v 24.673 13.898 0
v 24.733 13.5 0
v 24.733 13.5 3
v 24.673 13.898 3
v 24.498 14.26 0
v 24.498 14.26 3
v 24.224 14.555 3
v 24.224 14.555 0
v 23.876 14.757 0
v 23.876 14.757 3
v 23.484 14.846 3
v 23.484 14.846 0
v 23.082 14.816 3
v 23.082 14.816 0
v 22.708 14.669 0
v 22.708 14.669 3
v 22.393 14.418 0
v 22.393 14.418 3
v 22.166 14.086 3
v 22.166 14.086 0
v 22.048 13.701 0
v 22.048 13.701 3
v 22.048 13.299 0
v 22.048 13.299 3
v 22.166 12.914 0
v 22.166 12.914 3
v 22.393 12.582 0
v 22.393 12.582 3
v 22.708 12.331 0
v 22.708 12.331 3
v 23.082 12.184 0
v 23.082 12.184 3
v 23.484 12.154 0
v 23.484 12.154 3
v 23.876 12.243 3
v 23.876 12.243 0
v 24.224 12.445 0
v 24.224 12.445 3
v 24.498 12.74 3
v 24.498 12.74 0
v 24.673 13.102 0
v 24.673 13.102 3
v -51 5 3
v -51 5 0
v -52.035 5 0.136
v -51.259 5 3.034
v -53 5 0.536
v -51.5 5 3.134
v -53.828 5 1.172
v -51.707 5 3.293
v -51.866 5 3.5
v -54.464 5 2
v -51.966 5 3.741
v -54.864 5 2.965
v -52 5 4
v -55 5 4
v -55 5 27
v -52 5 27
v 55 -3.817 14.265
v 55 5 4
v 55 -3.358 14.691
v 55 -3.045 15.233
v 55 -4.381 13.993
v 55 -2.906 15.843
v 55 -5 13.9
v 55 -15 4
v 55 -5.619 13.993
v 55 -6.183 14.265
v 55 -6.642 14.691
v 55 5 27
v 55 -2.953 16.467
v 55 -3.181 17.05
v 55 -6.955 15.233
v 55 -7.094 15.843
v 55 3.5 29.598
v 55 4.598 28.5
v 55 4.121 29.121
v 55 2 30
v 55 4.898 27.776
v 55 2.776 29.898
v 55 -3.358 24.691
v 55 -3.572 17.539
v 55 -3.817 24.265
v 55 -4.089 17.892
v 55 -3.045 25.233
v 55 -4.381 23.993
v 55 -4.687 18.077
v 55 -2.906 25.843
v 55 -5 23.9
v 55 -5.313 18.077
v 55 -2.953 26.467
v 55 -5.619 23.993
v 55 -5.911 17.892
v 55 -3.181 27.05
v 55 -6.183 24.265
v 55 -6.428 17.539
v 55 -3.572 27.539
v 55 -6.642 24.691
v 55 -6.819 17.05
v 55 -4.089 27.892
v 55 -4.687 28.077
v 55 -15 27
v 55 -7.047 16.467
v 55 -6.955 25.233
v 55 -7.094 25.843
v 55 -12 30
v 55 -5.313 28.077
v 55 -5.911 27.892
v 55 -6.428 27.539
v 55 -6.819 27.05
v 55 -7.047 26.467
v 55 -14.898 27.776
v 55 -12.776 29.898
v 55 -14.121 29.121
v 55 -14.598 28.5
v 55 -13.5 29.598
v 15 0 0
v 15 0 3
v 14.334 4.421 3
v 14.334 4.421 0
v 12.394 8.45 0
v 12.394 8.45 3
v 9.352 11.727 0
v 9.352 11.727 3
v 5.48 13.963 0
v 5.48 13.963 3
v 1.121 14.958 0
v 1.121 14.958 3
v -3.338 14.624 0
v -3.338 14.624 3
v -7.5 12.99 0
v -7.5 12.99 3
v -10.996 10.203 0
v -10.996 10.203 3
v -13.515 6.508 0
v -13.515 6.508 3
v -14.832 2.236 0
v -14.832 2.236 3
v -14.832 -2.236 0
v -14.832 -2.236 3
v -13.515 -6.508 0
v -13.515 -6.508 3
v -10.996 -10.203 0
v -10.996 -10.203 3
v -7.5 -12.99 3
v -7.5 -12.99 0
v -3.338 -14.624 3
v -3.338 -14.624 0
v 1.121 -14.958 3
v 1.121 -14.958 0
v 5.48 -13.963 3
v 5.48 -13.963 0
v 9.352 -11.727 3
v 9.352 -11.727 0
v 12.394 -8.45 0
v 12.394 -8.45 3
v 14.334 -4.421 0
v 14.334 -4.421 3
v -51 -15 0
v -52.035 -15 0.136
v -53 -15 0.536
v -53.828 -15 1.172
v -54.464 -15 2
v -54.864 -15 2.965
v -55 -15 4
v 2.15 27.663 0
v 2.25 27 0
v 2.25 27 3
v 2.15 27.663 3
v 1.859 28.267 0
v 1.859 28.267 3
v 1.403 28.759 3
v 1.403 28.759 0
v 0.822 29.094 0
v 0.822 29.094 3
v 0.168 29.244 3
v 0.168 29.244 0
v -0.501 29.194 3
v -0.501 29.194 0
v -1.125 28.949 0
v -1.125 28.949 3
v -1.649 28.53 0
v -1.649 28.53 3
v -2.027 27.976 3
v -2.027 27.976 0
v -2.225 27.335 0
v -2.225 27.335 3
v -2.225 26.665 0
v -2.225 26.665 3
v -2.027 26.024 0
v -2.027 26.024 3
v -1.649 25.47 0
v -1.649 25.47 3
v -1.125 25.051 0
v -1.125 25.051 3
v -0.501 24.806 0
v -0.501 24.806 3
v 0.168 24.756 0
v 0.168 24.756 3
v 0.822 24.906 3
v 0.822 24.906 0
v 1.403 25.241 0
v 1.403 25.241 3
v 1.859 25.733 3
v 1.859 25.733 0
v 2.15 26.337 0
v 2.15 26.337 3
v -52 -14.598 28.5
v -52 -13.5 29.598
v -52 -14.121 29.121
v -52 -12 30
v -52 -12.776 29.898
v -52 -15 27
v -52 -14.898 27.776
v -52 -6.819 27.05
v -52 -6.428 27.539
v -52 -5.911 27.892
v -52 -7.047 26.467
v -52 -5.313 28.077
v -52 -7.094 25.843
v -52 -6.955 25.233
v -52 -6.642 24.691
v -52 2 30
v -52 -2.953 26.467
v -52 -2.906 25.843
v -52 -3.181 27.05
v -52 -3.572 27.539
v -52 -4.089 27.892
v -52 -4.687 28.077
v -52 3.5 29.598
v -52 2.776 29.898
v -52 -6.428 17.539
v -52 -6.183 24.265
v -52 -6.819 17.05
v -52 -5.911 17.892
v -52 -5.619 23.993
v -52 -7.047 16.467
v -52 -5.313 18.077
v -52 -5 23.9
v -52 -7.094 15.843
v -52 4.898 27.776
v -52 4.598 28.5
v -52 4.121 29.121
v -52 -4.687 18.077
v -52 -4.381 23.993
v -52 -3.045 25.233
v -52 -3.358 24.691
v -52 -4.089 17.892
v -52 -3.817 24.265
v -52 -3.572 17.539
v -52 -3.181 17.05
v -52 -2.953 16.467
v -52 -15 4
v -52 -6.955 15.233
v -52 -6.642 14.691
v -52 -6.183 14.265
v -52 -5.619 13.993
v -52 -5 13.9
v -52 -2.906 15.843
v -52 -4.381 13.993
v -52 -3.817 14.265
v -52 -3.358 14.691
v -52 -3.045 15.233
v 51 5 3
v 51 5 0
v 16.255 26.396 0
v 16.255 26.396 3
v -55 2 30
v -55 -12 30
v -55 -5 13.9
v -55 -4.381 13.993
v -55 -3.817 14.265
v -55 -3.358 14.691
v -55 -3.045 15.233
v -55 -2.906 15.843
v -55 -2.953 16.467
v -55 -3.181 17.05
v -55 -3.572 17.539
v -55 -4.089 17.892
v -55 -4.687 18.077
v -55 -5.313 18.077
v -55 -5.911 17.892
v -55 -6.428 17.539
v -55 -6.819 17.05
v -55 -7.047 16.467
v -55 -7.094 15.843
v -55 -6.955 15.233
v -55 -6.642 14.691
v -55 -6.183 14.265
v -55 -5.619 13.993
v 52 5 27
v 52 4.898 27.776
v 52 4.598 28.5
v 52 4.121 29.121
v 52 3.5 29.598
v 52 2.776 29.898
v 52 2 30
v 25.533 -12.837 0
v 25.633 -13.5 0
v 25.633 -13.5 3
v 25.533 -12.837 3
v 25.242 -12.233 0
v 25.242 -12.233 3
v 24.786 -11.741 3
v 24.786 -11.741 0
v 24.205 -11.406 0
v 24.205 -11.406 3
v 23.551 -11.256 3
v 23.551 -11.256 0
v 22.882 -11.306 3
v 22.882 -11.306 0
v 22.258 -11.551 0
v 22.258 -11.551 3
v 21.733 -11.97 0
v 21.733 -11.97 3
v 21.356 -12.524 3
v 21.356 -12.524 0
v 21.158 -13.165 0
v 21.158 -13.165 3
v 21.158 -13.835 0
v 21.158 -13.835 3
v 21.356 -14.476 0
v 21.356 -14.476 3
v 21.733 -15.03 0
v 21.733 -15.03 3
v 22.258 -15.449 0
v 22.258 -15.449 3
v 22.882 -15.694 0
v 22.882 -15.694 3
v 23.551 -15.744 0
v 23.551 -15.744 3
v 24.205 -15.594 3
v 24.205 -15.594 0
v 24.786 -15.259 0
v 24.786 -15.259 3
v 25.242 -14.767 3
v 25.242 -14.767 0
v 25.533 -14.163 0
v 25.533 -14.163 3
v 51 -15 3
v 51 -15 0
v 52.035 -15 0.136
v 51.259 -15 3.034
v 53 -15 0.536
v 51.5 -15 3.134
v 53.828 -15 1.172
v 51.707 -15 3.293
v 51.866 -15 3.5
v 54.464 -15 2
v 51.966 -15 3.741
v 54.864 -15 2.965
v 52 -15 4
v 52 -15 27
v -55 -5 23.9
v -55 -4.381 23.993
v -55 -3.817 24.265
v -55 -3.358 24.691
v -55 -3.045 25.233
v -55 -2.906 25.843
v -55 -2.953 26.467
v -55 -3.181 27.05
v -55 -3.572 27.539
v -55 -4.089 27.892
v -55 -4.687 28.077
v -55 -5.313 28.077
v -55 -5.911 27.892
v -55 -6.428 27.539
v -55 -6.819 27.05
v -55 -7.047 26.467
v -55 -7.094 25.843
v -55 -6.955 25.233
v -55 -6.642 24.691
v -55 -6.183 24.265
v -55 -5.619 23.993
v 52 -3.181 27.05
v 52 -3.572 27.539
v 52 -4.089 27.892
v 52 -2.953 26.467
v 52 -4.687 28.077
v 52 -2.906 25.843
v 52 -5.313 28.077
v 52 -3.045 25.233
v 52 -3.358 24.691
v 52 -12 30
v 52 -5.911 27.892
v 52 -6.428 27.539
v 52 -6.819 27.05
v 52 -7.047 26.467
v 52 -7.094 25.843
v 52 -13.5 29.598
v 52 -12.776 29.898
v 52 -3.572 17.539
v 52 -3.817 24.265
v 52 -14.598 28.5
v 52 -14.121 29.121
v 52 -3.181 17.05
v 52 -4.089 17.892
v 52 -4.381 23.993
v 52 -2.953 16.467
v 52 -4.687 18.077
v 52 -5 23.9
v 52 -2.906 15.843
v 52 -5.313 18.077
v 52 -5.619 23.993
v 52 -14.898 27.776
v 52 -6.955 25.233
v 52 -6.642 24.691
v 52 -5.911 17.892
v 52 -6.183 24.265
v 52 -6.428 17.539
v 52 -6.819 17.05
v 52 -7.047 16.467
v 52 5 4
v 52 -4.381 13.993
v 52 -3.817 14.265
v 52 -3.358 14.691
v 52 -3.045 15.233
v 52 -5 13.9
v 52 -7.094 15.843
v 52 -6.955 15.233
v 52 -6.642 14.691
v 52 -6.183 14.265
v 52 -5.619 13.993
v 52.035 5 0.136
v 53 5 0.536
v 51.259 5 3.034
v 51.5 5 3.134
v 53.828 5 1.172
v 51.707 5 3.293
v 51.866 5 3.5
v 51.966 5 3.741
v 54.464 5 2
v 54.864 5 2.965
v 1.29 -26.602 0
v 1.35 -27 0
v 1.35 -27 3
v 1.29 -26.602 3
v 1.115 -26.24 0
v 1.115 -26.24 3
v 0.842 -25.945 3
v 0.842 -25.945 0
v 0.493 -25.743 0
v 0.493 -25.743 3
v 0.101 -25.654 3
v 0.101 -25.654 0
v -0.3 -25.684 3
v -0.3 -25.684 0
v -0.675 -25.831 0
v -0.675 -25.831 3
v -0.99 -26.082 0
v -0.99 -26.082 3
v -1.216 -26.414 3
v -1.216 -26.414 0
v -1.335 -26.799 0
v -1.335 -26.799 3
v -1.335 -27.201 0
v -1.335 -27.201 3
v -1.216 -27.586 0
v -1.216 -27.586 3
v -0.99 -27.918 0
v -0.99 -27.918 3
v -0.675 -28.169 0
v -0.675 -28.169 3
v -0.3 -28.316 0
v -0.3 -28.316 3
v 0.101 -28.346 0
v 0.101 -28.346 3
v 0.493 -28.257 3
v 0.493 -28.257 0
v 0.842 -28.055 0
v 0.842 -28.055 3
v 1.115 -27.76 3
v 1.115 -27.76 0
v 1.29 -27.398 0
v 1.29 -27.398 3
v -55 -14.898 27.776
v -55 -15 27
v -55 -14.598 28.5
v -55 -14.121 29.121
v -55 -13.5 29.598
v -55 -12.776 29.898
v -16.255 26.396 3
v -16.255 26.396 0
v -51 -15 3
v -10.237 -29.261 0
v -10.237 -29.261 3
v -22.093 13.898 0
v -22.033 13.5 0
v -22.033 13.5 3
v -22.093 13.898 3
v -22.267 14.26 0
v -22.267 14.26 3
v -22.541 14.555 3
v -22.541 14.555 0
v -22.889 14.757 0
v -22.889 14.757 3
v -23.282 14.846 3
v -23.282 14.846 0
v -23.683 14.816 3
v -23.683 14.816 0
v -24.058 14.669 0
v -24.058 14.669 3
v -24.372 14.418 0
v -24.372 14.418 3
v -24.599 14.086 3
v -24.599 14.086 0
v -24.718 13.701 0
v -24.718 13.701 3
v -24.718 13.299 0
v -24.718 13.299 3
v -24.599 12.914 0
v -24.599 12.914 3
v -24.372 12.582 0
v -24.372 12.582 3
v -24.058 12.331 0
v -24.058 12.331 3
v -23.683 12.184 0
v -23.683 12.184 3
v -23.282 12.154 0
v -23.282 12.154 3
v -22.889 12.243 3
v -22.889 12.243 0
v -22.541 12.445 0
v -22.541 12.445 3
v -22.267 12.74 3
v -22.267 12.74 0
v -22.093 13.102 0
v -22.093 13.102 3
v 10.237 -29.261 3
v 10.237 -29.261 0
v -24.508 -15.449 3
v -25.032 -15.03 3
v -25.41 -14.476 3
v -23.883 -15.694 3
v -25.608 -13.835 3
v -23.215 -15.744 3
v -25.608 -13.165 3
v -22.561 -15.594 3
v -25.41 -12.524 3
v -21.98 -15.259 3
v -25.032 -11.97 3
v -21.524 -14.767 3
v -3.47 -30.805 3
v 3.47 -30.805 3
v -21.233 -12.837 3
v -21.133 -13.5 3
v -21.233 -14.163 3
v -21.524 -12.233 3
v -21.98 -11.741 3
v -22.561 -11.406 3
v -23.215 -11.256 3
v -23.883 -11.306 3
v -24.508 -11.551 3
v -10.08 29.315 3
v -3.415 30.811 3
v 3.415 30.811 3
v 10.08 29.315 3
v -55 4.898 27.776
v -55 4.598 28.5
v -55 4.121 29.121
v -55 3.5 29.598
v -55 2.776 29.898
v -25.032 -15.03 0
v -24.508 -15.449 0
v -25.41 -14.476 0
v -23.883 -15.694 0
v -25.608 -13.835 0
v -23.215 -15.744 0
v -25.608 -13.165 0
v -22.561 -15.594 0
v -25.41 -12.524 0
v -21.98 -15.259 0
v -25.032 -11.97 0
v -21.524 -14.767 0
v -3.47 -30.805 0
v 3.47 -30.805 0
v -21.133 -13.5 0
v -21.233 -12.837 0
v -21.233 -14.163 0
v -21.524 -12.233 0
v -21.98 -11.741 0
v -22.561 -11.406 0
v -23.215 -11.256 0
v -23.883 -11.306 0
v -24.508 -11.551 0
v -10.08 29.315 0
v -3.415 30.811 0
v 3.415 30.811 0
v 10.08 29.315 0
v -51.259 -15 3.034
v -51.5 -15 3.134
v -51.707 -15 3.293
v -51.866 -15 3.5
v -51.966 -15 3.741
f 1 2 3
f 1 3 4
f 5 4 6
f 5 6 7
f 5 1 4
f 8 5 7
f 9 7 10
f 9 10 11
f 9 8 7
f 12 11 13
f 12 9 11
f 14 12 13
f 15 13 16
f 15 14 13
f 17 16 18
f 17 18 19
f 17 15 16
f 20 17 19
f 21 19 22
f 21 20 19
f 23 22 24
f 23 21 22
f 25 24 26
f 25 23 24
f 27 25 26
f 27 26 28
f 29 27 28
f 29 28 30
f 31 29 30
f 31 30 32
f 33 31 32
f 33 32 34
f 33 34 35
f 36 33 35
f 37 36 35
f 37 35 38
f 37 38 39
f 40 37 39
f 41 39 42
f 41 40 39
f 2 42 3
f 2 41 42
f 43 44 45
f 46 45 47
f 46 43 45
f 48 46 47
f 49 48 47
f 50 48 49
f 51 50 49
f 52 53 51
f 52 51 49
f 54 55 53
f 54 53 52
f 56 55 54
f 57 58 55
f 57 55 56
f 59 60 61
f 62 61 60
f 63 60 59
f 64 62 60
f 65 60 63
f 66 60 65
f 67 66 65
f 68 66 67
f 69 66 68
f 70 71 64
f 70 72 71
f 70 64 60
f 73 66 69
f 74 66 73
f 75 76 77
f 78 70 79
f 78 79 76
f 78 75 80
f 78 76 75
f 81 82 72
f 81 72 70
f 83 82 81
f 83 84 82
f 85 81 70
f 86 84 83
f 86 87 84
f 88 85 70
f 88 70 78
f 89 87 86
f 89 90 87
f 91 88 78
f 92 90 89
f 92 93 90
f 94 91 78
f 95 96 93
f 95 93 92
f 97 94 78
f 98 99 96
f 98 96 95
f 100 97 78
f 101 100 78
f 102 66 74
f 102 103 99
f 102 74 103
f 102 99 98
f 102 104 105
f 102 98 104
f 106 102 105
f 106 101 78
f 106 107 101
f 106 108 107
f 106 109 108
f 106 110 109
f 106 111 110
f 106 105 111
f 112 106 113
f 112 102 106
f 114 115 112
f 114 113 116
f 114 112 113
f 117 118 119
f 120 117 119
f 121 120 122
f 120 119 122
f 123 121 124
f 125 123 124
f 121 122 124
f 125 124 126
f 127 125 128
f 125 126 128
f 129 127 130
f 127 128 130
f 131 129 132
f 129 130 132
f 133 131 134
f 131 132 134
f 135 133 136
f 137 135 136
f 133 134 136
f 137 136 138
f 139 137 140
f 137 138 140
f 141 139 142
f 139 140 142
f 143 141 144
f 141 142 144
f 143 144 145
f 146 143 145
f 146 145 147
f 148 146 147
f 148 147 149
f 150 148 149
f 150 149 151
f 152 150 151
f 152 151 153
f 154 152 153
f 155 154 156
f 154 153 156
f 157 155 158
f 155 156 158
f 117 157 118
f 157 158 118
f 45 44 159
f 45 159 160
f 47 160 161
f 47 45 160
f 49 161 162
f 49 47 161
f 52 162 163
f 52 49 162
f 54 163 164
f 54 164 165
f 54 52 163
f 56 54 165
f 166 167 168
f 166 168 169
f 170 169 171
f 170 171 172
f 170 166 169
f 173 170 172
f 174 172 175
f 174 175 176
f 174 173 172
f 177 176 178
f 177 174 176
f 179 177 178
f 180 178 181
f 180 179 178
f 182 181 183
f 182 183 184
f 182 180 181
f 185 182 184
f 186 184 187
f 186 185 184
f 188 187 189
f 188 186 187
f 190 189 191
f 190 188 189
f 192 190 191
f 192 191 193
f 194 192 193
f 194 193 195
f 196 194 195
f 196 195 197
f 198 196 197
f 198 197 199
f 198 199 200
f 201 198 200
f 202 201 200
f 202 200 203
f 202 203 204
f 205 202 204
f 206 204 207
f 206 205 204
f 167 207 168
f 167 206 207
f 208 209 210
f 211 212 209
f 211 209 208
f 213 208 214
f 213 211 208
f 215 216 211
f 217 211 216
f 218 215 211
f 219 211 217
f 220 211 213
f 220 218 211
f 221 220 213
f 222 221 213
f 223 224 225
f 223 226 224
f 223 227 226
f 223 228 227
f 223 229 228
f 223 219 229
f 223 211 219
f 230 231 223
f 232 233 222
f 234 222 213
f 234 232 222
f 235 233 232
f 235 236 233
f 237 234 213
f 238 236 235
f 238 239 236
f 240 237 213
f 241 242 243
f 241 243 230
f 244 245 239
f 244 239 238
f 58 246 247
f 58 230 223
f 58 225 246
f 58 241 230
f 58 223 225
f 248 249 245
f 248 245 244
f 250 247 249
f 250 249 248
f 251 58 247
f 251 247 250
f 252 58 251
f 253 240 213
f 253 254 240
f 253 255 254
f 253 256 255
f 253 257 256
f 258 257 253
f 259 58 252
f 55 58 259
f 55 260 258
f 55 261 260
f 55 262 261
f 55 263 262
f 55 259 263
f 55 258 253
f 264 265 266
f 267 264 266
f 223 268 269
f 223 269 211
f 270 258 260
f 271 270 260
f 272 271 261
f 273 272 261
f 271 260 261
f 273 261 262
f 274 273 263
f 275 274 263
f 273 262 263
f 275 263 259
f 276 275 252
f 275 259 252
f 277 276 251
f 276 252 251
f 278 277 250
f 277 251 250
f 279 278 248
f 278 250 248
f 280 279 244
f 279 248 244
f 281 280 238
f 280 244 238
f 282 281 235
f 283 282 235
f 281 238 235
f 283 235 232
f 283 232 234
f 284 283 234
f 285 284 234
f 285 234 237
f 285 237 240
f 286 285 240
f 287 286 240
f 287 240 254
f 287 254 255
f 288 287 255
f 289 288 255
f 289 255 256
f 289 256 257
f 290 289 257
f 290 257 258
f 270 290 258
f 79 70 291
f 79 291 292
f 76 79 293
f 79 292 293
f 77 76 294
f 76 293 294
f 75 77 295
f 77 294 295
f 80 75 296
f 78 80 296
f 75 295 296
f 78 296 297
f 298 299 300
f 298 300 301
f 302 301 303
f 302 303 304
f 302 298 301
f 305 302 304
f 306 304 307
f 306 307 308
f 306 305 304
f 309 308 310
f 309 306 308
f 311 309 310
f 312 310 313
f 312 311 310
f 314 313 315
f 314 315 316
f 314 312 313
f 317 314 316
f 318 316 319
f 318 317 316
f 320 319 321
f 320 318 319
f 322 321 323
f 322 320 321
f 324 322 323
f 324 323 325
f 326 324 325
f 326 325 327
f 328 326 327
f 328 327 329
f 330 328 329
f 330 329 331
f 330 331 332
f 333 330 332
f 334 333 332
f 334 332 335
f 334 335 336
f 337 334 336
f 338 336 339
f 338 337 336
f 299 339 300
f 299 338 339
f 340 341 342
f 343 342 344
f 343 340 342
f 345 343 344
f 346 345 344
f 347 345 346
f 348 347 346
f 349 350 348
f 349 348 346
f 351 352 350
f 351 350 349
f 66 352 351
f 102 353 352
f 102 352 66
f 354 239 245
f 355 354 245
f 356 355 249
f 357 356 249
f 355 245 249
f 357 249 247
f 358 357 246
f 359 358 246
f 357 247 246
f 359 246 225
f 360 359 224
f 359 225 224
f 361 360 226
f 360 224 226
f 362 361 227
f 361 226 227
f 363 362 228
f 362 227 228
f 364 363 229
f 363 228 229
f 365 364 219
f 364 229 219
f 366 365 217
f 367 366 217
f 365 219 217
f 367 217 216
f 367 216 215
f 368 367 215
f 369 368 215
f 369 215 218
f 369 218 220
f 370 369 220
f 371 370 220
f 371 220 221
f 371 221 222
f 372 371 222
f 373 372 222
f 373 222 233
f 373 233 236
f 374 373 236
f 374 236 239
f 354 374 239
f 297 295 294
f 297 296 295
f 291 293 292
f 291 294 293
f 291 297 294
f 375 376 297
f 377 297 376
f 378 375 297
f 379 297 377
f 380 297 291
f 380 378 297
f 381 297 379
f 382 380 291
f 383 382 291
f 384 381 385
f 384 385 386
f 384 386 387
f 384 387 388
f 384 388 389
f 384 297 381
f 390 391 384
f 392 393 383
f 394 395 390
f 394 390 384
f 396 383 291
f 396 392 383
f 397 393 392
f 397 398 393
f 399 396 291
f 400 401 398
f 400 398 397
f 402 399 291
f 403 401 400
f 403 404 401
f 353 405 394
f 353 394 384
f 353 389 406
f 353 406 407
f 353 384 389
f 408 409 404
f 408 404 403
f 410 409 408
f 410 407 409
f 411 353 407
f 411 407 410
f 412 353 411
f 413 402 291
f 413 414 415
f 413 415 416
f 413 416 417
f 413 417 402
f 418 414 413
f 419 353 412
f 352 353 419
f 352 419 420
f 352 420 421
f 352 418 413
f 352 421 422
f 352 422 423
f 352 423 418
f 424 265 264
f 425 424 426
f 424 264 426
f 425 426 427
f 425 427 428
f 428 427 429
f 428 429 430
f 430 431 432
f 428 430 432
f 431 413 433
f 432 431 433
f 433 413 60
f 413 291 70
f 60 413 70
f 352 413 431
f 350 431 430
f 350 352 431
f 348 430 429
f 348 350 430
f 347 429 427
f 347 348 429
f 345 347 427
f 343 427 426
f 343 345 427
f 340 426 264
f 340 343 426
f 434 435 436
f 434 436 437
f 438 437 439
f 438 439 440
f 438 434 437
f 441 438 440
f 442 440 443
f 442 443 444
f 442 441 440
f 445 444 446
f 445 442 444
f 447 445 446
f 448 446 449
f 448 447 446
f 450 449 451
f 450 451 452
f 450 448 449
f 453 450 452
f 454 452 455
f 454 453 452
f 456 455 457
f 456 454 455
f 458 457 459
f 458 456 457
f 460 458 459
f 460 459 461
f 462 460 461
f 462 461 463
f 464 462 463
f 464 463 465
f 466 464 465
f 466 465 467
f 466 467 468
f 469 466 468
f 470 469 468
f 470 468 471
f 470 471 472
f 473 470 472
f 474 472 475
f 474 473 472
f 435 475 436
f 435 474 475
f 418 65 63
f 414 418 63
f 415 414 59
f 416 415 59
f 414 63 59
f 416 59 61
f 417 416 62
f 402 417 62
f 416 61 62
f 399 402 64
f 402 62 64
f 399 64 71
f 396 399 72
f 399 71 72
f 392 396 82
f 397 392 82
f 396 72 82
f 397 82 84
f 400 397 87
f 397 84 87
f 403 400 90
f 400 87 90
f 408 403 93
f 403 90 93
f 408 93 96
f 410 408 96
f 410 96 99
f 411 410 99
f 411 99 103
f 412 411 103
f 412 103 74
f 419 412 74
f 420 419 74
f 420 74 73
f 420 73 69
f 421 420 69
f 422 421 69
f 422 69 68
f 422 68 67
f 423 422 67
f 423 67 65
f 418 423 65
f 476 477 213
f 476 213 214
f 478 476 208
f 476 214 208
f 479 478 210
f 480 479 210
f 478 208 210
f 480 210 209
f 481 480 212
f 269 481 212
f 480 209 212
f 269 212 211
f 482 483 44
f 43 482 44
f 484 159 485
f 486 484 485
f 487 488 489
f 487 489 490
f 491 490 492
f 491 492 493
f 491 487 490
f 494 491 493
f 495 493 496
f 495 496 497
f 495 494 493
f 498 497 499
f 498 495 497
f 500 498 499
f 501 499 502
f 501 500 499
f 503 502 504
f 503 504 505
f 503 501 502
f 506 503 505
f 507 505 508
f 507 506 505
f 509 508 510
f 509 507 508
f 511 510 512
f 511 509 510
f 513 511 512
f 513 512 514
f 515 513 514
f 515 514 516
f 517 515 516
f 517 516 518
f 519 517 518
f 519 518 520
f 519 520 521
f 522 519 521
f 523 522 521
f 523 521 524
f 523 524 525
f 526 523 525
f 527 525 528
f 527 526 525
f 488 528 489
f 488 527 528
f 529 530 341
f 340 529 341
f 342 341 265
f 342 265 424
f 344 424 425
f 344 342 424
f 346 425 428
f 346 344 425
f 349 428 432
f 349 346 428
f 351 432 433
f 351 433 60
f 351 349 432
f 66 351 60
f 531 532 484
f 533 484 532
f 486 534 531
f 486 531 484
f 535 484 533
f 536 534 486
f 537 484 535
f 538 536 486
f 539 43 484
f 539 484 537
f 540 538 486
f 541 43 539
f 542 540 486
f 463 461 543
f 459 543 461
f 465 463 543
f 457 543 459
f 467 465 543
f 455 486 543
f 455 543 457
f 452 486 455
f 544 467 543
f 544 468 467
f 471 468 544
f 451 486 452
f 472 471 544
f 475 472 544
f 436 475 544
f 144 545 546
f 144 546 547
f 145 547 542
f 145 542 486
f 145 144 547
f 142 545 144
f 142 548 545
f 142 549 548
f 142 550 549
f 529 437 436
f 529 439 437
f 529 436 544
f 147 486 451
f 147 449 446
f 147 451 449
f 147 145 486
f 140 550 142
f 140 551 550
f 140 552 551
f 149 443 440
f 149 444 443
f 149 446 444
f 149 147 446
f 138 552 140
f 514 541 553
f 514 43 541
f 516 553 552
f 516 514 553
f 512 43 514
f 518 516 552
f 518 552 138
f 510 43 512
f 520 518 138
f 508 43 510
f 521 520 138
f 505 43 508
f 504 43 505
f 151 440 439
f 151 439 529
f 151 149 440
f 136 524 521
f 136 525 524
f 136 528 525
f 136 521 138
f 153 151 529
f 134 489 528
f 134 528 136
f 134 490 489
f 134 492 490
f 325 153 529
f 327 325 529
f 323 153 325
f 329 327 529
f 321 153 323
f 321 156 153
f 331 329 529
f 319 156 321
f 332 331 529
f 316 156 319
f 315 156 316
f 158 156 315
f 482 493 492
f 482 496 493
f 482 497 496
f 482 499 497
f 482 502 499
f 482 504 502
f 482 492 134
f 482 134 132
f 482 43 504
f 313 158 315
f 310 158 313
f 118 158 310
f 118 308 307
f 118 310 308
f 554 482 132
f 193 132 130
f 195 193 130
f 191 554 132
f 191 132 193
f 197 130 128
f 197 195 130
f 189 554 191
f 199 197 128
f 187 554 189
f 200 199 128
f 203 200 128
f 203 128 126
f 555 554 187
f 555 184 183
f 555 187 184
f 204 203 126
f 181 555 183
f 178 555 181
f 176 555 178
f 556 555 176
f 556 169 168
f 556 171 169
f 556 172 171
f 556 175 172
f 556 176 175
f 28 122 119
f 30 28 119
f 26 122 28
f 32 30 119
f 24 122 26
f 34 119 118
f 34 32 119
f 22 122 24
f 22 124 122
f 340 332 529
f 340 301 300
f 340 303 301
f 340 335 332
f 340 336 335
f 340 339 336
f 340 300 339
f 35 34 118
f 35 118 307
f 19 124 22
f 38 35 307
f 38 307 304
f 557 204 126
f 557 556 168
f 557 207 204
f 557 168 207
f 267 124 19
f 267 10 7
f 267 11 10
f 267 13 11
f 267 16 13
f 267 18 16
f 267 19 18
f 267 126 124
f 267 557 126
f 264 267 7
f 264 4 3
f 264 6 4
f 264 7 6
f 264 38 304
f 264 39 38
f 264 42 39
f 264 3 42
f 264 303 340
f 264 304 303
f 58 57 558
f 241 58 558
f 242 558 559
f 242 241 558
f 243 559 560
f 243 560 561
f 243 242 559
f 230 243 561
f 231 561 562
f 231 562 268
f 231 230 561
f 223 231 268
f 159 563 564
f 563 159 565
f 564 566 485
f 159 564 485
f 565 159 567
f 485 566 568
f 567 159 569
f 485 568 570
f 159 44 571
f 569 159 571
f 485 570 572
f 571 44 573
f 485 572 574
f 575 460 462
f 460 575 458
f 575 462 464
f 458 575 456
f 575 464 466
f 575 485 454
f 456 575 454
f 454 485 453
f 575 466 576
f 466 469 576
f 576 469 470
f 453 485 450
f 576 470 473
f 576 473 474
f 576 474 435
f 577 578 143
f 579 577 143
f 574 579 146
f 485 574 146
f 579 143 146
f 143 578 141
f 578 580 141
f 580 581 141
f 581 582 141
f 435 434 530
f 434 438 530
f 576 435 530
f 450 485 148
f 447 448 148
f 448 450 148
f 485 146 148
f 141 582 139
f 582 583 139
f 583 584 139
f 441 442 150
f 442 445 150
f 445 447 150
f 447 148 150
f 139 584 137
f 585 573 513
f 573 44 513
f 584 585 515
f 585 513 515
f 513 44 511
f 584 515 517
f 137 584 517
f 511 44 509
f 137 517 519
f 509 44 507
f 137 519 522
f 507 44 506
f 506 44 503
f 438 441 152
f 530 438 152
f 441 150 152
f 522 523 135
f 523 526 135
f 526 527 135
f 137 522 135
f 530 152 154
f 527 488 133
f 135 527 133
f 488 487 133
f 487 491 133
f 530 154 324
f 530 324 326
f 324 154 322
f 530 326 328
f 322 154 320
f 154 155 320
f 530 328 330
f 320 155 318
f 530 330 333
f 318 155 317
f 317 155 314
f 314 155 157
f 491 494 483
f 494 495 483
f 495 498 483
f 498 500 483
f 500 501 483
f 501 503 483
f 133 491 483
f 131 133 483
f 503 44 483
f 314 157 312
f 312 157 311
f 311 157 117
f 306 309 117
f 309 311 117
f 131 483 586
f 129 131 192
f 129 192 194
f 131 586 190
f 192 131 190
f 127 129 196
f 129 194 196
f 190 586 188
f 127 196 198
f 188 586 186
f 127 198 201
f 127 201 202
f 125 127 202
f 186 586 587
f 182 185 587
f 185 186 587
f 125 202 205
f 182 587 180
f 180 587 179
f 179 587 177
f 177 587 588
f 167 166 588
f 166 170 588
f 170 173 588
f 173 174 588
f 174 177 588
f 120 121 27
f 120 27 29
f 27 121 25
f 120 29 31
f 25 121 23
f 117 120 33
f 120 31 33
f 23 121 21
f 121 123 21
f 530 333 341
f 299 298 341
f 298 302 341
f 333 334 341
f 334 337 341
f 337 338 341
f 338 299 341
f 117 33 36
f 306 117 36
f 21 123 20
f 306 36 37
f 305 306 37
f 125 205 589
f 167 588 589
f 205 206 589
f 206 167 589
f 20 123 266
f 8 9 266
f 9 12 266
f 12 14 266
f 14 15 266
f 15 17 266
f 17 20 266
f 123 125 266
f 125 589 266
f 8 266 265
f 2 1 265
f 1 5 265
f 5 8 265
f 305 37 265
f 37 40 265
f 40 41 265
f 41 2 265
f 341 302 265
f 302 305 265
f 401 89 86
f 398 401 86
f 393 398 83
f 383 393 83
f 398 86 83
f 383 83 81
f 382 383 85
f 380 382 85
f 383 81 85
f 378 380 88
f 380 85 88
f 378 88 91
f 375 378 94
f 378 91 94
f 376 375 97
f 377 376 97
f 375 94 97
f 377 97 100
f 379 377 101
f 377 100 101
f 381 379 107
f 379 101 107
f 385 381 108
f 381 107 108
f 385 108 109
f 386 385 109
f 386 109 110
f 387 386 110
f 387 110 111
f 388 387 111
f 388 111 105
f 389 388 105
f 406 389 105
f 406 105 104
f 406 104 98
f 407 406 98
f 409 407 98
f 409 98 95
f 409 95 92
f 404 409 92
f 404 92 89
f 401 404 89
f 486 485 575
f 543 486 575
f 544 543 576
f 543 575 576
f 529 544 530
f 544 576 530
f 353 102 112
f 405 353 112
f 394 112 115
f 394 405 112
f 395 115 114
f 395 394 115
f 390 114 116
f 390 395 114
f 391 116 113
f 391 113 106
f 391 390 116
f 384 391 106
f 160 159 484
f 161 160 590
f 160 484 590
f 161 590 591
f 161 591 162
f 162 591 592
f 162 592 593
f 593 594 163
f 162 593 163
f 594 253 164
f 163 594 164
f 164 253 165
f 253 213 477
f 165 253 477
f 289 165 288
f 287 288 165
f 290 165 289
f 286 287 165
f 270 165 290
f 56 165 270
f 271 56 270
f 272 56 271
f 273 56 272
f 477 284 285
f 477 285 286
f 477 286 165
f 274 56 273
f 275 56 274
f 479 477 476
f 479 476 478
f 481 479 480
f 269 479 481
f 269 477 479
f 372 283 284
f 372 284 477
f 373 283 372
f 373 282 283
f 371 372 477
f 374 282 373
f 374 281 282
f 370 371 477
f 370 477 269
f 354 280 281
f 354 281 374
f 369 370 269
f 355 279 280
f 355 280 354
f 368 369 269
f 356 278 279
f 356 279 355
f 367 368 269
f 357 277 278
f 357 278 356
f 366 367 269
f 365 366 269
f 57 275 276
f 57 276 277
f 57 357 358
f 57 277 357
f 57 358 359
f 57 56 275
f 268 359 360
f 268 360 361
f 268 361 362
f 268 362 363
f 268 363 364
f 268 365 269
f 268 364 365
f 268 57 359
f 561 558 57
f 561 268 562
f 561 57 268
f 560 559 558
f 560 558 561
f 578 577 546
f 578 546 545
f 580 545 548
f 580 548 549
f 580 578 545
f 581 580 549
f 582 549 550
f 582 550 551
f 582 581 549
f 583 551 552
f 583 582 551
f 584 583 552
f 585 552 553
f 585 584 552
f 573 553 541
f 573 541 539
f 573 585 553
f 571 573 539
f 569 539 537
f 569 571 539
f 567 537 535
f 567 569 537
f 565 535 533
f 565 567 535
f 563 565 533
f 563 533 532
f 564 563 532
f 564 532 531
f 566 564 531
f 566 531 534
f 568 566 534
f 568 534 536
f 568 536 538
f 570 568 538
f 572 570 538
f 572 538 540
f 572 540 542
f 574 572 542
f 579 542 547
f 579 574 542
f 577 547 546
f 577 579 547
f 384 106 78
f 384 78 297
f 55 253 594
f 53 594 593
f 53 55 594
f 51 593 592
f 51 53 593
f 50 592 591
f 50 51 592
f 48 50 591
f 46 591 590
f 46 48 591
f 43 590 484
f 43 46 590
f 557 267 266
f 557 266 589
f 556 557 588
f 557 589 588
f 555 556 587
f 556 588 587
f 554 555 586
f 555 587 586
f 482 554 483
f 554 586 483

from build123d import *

# Parameters (mm, degrees)
SKETCH_1_R                  = 31
SKETCH_1_R_2                = 2.25
SKETCH_1_R_3                = 1.35
EXTRUDE_1_DEPTH             = 3
EXTRUDE_START               = -3
EXTRUDE_2_DEPTH             = 3
SKETCH_7_R                  = 15
CUT_EXTRUDE_1_DEPTH         = 3
SM_EDGE_FLANGE_1_DEPTH      = 20
SM_EDGE_FLANGE_1_BEND_DEPTH = 20
SKETCH_14_R                 = 2.1
CUT_EXTRUDE_2_DEPTH         = 119.156675647
FILLET_1_R                  = 3


# Sheet-metal steps are written as plain solids
with BuildPart() as part:
    # Sketch 1 → 凸台-拉伸1 (new body)
    with BuildSketch(Plane.XY):
        Circle(SKETCH_1_R)
        with Locations((0, 27)):
            Circle(SKETCH_1_R_2, mode=Mode.SUBTRACT)
        with Locations((0, -27)):
            Circle(SKETCH_1_R_3, mode=Mode.SUBTRACT)
        with Locations((23.382685902, -13.5)):
            Circle(SKETCH_1_R_2, mode=Mode.SUBTRACT)
        with Locations((-23.382685902, 13.5)):
            Circle(SKETCH_1_R_3, mode=Mode.SUBTRACT)
        with Locations((-23.382685902, -13.5)):
            Circle(SKETCH_1_R_2, mode=Mode.SUBTRACT)
        with Locations((23.382685902, 13.5)):
            Circle(SKETCH_1_R_3, mode=Mode.SUBTRACT)
    extrude(amount=EXTRUDE_1_DEPTH)

    # Sketch 2 → 凸台-拉伸2 (add)
    with BuildSketch(Plane.XY.offset(3).offset(EXTRUDE_START)):
        with BuildLine():
            ThreePointArc((-10.236969115, -29.260971674), (-30.820342362, -3.332641094), (-16.255261315, 26.396334586))
            Line((-16.255261315, 26.396334586), (-51, 5))
            Line((-51, 5), (-51, -15))
            Line((-51, -15), (-10.236969115, -29.260971674))
        make_face()
        with BuildLine():
            Line((51, -15), (51, 5))
            Line((51, 5), (16.255261315, 26.396334586))
            ThreePointArc((16.255261315, 26.396334586), (27.063934496, 15.117653575), (31, 0))
            ThreePointArc((31, 0), (25.281871396, -17.939536747), (10.236969115, -29.260971674))
            Line((10.236969115, -29.260971674), (51, -15))
        make_face()
    extrude(amount=EXTRUDE_2_DEPTH)

    # 草图7 → 切除-拉伸1 (cut)
    with BuildSketch(Plane.XY.offset(3)):
        Circle(SKETCH_7_R)
    extrude(amount=-CUT_EXTRUDE_1_DEPTH, mode=Mode.SUBTRACT)

    # 边线-法兰1 section (across the edge) → 边线-法兰1 (add)
    with BuildSketch(Plane(origin=(-52, 5, 3), x_dir=(1, 0, 0), z_dir=(0, -1, 0))):
        with BuildLine():
            Line((-3, 1), (-3, 27))
            Line((-3, 27), (0, 27))
            Line((0, 27), (0, 1))
            ThreePointArc((0, 1), (0.292893219, 0.292893219), (1, 0))
            Line((1, 0), (1, -3))
            ThreePointArc((1, -3), (-1.828427125, -1.828427125), (-3, 1))
        make_face()
    extrude(amount=SM_EDGE_FLANGE_1_DEPTH)

    # 边线-法兰1 section 2 (across the edge) → 边线-法兰1 bend (add)
    with BuildSketch(Plane(origin=(52, -15, 3), x_dir=(-1, 0, 0), z_dir=(0, 1, 0))):
        with BuildLine():
            Line((-3, 1), (-3, 27))
            Line((-3, 27), (0, 27))
            Line((0, 27), (0, 1))
            ThreePointArc((0, 1), (0.292893219, 0.292893219), (1, 0))
            Line((1, 0), (1, -3))
            ThreePointArc((1, -3), (-1.828427125, -1.828427125), (-3, 1))
        make_face()
    extrude(amount=SM_EDGE_FLANGE_1_BEND_DEPTH)

    # 草图14 → 切除-拉伸2 (cut, through all)
    with BuildSketch(Plane(origin=(55, 0, 0), x_dir=(0, 0, -1), z_dir=(1, 0, 0))):
        with Locations((-16, -5)):
            Circle(SKETCH_14_R)
        with Locations((-26, -5)):
            Circle(SKETCH_14_R)
    extrude(amount=-CUT_EXTRUDE_2_DEPTH, mode=Mode.SUBTRACT)

    # 圆角1
    fillet_1_edges = [part.edges().sort_by_distance(p)[0] for p in [
        (-53.5, 5, 30),
        (-53.5, -15, 30),
        (53.5, -15, 30),
        (53.5, 5, 30),
    ]]
    fillet(fillet_1_edges, radius=FILLET_1_R)


solid = part.part
